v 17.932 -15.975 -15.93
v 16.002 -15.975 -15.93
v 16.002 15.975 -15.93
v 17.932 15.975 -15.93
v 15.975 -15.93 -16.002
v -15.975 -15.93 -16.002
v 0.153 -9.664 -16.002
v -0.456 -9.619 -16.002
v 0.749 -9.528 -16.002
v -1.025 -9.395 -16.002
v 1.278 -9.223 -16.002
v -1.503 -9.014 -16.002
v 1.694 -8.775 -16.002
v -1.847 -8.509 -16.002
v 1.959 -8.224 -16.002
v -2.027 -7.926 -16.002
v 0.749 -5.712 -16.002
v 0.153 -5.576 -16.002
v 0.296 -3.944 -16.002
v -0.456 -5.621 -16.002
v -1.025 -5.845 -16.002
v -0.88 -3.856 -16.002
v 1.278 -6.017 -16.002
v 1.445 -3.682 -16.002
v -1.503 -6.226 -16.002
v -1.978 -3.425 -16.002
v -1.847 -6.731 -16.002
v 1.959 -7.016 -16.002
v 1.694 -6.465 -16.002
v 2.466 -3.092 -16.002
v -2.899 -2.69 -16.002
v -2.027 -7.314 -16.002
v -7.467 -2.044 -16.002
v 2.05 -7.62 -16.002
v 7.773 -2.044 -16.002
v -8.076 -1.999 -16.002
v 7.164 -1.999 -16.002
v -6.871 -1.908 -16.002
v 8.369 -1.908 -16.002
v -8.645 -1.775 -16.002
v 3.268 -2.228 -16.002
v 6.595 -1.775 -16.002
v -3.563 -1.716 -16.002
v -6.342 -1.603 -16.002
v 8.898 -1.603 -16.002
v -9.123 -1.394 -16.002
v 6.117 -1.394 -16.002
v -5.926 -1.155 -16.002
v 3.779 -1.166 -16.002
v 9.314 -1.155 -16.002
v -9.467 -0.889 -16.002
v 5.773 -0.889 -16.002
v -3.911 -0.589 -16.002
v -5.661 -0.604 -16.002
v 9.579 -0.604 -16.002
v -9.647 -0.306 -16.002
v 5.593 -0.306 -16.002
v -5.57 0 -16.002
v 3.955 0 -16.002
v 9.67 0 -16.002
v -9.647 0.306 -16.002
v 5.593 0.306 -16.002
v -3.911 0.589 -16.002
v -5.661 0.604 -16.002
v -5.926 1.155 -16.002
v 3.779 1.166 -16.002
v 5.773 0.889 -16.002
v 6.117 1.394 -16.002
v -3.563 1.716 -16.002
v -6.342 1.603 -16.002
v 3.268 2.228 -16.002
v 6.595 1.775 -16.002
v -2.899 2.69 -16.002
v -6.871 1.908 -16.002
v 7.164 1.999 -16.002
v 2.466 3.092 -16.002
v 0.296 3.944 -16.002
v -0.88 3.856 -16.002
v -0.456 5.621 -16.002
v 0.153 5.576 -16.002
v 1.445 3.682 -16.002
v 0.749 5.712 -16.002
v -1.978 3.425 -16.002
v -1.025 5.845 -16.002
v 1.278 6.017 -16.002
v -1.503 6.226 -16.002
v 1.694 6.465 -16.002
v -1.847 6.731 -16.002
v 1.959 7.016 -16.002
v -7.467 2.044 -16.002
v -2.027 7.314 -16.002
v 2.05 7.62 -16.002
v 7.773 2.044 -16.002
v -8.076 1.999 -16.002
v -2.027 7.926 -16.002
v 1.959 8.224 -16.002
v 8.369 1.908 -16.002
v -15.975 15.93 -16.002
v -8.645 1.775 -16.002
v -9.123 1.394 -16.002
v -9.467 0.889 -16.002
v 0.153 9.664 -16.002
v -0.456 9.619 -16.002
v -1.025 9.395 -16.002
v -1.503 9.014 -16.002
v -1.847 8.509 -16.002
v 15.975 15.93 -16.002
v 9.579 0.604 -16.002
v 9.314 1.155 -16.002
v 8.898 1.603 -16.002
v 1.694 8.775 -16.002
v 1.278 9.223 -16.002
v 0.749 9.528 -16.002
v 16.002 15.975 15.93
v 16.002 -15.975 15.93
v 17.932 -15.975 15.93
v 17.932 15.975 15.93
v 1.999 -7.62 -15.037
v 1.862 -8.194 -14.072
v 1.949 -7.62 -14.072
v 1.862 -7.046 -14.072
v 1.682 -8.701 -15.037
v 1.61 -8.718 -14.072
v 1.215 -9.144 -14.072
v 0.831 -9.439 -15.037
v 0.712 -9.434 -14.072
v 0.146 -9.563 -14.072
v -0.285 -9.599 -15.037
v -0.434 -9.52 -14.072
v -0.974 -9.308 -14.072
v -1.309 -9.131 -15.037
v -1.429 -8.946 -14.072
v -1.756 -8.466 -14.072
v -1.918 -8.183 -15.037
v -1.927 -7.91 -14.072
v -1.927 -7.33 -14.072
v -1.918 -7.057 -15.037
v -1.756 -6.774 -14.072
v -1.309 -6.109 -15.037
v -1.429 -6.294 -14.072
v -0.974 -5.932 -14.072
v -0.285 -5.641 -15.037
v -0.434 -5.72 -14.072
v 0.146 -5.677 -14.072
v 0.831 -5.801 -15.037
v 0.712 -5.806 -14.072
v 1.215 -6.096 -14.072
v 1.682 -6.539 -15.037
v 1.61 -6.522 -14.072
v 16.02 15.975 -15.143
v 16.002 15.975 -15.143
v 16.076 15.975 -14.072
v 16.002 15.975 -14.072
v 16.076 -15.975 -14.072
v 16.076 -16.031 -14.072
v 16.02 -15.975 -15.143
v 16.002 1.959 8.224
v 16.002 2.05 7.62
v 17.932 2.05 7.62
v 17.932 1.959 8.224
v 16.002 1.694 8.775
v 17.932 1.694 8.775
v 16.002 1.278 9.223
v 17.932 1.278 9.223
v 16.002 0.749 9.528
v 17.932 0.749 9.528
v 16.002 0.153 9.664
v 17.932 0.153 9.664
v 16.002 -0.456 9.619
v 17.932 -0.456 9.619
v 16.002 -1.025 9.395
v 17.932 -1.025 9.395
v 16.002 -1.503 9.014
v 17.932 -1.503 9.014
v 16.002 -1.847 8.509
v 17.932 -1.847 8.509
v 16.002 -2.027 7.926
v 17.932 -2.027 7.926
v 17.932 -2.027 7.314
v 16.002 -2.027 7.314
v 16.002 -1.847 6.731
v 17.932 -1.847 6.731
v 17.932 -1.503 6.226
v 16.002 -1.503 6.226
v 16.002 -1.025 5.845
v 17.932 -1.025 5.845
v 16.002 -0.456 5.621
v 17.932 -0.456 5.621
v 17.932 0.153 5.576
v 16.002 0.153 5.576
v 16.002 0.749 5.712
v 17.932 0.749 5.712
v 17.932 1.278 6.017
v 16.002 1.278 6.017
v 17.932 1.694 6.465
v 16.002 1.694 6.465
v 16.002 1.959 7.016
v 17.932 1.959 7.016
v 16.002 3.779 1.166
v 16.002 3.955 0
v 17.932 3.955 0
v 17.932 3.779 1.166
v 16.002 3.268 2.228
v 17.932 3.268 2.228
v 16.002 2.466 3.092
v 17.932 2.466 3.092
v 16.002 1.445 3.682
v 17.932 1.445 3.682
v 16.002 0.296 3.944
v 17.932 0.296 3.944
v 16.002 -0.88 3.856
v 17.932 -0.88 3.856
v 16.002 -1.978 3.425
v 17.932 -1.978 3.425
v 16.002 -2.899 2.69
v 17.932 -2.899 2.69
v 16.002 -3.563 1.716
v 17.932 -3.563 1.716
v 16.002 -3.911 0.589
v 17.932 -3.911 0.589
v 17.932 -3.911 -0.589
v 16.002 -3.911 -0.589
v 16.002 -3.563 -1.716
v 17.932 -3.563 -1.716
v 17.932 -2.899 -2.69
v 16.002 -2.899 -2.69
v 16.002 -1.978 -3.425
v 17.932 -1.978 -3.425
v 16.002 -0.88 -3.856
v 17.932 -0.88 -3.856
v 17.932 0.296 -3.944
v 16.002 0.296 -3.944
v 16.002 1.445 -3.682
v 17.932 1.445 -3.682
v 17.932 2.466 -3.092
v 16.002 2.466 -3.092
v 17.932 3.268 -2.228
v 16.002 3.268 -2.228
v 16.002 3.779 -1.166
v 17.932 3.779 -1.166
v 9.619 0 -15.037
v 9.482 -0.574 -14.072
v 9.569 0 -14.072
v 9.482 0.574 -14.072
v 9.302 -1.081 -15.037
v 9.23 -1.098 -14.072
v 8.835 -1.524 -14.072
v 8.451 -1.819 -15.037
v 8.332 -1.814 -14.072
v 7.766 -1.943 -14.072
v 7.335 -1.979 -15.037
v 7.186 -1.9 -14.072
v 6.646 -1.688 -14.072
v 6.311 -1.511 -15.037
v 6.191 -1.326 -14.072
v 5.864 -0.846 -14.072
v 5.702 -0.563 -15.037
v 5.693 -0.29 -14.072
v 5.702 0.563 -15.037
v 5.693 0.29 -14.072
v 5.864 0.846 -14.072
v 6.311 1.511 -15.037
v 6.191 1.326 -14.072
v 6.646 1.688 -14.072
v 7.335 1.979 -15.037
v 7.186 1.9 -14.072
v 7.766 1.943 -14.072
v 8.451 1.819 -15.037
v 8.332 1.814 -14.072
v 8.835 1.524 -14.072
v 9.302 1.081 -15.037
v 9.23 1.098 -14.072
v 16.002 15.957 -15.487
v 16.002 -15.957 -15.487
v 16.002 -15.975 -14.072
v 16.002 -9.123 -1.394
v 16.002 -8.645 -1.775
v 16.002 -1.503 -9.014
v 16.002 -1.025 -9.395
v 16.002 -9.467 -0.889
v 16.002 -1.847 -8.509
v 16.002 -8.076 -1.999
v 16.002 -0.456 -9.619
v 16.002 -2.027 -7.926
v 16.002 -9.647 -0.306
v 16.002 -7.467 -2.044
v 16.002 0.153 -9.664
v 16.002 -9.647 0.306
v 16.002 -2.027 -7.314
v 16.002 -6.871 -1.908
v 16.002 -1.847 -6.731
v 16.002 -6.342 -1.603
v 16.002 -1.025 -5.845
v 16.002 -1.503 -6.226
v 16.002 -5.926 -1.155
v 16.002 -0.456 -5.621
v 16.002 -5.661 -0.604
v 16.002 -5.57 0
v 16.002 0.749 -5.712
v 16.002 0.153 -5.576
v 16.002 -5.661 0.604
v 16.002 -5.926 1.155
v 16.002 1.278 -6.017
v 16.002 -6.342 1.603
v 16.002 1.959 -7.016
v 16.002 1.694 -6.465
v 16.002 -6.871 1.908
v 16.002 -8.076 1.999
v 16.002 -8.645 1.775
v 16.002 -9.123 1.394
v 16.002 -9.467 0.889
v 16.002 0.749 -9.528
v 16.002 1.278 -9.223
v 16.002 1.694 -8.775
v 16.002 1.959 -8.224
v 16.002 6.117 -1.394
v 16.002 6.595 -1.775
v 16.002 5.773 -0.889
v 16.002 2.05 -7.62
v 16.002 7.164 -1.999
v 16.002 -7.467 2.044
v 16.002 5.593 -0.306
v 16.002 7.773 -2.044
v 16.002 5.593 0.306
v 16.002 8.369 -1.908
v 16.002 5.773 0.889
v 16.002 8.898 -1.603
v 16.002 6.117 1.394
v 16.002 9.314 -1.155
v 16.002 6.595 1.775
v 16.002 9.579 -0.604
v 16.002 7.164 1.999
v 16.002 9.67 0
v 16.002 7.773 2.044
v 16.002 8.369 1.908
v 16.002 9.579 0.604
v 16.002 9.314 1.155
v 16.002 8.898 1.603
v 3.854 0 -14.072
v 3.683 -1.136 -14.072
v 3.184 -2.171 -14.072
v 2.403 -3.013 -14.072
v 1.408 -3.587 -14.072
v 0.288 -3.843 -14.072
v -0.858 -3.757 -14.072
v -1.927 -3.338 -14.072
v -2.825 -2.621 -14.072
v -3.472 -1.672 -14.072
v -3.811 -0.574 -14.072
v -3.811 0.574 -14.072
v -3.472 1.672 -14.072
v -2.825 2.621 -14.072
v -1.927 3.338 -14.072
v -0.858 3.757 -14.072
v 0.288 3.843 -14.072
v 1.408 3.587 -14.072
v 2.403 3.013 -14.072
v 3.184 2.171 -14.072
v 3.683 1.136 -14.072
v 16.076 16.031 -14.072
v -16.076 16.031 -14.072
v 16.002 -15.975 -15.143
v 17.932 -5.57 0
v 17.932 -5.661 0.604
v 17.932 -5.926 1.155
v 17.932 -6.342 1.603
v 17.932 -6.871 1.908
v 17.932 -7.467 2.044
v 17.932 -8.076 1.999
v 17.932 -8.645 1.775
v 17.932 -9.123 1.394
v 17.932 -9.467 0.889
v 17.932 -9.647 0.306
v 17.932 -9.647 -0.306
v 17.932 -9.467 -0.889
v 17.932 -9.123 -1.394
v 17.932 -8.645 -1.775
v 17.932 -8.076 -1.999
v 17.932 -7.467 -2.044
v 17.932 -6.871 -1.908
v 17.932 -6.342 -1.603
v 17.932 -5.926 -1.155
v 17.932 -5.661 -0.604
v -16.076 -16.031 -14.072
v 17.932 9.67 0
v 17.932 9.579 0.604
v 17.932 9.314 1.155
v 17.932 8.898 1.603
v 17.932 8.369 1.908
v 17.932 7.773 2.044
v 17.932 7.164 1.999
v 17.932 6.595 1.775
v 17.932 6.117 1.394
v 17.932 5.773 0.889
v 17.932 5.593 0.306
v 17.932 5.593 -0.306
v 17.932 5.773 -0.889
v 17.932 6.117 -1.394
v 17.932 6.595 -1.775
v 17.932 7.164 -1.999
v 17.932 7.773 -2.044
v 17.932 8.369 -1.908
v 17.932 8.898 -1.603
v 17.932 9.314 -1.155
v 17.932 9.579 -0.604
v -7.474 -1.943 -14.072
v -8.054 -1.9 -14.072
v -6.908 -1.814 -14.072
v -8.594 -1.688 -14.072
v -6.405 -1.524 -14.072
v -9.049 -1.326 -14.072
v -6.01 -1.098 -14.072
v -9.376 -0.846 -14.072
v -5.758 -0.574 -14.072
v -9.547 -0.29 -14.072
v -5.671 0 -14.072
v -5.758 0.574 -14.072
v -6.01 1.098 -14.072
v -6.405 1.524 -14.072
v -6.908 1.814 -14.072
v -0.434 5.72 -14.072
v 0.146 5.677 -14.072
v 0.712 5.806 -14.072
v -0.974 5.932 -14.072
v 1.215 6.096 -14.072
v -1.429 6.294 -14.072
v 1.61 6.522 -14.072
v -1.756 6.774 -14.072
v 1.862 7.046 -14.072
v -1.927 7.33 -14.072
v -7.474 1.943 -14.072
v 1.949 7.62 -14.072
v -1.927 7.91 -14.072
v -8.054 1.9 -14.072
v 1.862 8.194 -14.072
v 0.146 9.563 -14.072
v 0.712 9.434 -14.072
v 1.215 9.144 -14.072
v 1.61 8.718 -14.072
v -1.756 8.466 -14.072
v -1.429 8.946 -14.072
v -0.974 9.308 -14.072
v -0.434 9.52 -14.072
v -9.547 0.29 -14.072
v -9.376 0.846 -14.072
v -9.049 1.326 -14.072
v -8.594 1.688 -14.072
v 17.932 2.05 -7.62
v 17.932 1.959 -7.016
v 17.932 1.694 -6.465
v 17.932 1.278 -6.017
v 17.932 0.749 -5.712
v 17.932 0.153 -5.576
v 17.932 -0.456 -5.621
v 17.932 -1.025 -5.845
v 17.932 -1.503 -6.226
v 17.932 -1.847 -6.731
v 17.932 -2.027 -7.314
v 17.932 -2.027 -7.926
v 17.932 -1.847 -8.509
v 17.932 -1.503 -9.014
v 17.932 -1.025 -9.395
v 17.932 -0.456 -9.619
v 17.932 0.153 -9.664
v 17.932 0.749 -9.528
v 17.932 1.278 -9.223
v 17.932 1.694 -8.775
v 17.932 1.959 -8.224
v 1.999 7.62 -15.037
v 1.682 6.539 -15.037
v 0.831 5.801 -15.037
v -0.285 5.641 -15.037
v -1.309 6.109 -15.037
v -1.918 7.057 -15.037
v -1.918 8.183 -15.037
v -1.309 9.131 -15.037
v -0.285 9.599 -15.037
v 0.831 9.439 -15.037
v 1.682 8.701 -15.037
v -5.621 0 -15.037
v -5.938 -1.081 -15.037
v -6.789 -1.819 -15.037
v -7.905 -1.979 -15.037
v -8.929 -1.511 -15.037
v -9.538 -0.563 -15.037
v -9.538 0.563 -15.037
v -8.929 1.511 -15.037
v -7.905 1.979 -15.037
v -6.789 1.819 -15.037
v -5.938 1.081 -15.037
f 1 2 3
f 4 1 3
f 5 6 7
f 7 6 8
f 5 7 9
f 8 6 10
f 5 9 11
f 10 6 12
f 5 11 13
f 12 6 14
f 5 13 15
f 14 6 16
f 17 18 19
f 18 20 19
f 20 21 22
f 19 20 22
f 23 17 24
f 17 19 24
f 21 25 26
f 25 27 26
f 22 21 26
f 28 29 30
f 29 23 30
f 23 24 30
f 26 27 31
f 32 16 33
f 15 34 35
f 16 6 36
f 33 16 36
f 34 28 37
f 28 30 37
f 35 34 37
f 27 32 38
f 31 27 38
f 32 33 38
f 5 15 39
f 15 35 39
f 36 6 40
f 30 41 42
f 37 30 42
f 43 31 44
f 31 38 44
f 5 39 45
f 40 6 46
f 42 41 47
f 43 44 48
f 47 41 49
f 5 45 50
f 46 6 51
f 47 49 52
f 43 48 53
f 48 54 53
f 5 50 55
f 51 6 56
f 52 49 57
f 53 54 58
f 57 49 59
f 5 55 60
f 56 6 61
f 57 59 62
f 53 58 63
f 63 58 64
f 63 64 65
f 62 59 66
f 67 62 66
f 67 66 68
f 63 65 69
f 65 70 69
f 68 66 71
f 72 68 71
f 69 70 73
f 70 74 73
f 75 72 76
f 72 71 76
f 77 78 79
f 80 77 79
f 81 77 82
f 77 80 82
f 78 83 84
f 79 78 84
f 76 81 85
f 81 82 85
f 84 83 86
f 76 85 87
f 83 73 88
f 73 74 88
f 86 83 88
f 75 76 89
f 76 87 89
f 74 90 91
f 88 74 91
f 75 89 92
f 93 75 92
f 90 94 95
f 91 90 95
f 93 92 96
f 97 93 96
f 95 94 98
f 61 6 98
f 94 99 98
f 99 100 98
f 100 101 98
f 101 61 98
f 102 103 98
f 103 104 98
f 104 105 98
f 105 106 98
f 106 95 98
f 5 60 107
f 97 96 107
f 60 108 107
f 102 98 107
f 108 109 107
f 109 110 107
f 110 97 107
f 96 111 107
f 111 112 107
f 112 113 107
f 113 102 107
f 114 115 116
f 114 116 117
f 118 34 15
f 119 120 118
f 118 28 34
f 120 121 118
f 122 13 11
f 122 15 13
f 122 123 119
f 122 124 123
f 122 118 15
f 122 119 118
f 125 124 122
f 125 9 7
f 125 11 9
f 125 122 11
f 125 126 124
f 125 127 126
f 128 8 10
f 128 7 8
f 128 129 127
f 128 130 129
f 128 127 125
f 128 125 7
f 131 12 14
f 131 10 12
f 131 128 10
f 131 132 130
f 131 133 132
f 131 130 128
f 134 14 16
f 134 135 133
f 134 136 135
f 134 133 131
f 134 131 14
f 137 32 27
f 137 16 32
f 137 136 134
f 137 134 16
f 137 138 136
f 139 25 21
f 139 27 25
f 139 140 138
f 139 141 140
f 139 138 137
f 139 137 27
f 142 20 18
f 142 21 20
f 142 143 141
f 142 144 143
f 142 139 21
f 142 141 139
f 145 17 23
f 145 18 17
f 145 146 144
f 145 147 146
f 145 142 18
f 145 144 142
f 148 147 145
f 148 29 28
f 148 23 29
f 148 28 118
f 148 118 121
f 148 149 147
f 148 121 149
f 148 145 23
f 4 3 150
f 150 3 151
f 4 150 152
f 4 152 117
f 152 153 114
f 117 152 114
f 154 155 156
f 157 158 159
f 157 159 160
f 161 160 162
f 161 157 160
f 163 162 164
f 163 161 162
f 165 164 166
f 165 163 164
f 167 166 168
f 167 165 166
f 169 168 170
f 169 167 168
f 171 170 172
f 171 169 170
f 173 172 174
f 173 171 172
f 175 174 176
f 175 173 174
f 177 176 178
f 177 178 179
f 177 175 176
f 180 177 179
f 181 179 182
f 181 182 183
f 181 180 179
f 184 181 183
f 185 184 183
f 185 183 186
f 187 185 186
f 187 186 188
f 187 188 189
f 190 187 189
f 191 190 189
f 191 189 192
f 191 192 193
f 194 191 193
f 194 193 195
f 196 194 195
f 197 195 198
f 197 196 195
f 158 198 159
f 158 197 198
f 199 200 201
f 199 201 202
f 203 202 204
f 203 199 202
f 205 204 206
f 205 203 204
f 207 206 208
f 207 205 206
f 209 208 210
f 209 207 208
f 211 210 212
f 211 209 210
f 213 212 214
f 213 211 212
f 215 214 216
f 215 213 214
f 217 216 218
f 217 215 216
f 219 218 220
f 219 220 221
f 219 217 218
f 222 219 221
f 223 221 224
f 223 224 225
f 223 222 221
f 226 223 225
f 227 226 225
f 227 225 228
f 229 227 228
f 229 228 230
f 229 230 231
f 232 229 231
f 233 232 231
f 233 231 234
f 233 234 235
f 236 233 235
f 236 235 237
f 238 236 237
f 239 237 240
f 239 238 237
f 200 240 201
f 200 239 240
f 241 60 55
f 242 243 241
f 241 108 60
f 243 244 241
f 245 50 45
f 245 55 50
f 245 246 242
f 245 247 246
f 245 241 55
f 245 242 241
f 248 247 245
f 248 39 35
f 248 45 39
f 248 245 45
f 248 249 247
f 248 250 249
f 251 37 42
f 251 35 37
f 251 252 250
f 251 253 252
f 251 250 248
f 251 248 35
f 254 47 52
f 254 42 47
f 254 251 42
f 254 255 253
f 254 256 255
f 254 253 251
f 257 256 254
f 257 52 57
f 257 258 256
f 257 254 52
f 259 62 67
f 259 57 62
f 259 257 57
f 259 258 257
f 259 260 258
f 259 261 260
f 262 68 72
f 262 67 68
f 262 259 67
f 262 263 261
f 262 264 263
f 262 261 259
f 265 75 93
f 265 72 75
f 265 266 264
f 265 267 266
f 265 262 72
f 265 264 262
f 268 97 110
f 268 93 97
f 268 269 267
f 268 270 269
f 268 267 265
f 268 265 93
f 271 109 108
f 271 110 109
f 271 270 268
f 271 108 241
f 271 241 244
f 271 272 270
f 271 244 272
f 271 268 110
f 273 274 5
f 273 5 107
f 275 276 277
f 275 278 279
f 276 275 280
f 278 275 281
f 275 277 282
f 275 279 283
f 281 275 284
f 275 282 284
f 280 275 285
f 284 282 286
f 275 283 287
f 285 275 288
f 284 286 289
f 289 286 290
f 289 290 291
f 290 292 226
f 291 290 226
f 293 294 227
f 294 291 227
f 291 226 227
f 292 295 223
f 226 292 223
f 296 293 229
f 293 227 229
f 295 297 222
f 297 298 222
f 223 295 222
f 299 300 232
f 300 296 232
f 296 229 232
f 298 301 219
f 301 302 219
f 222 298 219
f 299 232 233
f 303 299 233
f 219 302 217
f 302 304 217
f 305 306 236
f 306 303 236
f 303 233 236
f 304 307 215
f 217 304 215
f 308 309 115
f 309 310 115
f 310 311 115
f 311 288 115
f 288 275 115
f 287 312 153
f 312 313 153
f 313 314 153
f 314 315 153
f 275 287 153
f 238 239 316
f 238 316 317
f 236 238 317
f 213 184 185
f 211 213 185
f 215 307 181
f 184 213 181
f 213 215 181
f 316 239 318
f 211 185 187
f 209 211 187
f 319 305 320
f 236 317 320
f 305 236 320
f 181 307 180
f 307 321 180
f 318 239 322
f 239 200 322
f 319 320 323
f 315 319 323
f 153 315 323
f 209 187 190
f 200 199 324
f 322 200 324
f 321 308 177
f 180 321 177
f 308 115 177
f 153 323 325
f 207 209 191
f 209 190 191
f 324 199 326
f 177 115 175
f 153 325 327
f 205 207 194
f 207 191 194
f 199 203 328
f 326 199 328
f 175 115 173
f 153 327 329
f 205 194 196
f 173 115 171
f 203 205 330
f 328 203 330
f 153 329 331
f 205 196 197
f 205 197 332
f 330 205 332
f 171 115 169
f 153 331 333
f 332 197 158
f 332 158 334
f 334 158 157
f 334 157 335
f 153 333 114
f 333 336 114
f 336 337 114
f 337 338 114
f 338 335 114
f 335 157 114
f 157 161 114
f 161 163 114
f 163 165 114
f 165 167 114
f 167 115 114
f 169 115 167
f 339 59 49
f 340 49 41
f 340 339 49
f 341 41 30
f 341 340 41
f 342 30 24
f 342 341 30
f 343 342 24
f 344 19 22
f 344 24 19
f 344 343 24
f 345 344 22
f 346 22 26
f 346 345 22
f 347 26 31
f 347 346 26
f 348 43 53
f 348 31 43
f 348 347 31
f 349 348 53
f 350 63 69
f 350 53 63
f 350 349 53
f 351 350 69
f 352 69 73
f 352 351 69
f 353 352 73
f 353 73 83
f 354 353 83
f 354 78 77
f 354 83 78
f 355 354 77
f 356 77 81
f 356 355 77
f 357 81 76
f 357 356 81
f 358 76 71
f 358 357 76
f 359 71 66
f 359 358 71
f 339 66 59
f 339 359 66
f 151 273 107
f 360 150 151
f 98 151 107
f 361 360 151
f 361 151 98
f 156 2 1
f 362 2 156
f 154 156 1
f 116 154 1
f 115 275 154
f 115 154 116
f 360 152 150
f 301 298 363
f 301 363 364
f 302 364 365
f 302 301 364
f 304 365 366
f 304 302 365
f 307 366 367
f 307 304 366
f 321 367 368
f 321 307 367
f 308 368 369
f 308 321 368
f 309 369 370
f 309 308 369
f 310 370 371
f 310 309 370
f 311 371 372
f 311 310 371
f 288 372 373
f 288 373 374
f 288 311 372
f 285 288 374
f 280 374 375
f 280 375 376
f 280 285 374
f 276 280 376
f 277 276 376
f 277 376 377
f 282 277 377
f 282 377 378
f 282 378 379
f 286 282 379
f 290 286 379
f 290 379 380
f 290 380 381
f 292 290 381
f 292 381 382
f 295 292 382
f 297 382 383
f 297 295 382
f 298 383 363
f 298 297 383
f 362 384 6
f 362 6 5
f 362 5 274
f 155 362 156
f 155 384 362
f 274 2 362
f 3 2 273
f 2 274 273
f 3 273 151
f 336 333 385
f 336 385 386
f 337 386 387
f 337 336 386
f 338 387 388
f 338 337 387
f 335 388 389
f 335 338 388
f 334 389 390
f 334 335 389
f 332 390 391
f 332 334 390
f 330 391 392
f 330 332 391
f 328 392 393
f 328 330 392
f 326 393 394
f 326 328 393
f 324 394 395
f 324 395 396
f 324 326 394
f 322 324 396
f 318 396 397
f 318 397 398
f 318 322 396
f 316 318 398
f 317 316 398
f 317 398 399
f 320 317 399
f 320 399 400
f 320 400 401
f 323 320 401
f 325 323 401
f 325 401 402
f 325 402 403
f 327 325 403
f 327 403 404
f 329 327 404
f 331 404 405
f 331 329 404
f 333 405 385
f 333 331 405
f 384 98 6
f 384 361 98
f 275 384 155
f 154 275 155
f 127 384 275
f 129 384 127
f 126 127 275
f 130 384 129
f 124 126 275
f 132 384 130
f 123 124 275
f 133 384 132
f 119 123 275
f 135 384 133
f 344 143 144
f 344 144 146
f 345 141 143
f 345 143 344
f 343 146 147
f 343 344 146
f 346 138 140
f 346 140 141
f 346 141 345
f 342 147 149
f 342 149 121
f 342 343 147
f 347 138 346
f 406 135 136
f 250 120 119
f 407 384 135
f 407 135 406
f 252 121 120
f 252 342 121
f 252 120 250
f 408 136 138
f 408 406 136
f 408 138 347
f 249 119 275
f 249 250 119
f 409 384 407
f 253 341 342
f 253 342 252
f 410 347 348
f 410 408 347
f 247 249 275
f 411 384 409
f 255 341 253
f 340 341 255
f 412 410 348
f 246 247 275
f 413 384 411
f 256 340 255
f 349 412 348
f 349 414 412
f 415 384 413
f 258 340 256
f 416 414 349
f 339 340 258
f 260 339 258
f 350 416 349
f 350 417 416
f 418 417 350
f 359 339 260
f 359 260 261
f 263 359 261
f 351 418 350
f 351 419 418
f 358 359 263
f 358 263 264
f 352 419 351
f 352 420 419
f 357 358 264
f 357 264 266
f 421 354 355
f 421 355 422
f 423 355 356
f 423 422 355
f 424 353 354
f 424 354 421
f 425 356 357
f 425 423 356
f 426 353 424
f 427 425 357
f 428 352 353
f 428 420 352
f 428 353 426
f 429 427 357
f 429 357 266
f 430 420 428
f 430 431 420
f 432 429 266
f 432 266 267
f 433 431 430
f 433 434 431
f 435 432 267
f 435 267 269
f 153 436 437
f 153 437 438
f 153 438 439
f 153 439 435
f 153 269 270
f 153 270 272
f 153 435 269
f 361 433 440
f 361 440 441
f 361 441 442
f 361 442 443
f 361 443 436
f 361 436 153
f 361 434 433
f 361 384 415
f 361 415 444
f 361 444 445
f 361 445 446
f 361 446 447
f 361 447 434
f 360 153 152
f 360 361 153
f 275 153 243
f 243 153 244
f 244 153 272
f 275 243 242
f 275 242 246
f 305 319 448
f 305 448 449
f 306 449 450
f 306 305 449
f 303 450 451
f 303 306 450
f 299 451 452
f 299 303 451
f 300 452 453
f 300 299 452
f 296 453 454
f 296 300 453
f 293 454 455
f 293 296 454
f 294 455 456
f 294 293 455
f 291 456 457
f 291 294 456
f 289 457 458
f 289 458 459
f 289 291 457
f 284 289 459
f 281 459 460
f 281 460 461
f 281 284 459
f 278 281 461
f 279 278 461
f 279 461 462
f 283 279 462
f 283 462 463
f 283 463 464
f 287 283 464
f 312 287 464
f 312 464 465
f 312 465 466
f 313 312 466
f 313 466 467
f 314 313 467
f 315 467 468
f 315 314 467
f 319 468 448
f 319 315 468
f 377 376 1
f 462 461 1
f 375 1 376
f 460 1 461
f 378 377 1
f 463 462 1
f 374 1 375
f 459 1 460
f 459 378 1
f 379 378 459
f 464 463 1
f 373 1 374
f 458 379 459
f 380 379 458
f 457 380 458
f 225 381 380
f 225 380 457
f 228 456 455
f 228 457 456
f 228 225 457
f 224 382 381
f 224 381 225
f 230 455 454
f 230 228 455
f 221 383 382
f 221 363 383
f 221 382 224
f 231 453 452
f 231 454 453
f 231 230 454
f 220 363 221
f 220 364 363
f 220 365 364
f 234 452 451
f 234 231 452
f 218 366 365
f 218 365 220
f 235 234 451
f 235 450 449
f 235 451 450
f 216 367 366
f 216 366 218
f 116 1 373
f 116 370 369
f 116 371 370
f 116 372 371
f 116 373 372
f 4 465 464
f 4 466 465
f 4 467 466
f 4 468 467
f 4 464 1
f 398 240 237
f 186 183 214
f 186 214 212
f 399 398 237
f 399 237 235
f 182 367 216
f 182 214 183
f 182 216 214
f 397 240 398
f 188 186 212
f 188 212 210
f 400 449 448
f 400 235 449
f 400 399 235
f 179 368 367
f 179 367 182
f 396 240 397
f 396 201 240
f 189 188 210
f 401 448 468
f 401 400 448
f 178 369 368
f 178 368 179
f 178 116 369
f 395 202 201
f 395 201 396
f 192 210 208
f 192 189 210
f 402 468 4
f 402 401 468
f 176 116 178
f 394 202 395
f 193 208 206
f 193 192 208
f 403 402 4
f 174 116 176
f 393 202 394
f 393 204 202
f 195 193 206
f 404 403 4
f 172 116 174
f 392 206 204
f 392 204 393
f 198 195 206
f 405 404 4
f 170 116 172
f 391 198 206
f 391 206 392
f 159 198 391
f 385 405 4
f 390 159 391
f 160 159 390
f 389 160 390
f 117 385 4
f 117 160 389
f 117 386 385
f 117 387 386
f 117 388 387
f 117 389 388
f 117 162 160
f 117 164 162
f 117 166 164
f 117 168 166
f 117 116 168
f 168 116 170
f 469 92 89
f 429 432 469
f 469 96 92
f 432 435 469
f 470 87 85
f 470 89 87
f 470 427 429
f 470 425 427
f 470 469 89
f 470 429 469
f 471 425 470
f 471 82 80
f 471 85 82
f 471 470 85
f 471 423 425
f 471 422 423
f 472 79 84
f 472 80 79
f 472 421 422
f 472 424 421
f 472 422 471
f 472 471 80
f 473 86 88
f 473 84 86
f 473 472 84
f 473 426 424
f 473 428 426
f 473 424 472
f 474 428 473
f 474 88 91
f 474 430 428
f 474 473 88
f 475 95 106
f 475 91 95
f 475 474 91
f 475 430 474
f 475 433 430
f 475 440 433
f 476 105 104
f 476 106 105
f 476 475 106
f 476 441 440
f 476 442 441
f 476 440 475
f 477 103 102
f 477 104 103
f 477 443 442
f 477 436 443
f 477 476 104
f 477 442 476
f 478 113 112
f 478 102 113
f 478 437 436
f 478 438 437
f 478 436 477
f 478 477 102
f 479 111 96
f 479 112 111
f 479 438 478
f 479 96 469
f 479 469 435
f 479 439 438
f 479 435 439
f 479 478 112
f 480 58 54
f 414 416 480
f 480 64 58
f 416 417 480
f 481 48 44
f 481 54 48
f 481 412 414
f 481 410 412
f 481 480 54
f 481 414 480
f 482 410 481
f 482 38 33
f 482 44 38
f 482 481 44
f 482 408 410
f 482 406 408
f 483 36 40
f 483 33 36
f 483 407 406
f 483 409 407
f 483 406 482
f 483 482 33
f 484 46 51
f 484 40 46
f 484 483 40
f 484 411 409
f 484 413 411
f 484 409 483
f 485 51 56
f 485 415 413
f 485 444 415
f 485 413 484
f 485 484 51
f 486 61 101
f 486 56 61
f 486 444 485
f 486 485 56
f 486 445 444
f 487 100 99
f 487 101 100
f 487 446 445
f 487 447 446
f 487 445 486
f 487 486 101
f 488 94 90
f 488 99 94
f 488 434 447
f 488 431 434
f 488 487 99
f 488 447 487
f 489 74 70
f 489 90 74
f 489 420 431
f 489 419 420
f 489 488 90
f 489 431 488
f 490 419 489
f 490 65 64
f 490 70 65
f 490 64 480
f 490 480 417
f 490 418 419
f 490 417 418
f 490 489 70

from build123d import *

# Parameters (mm, degrees)
F3_W     = 31.95
F3_H     = 31.86
F3_R     = 2.05
F3_R_2   = 3.955
F4_DEPTH = 1.9304
F1_W     = 31.95
F1_H     = 31.86
F1_R     = 2.05
F1_R_2   = 3.955
F5_DEPTH = 1.9304
F5_TAPER = -3


with BuildPart() as f4:
    # F3 (on offset) → F4 (new body)
    with BuildSketch(Plane.YZ.offset(16.002)):
        Rectangle(F3_W, F3_H)
        with Locations((0, -7.62)):
            Circle(F3_R, mode=Mode.SUBTRACT)
        with Locations((-7.62, 0)):
            Circle(F3_R, mode=Mode.SUBTRACT)
        Circle(F3_R_2, mode=Mode.SUBTRACT)
        with Locations((7.62, 0)):
            Circle(F3_R, mode=Mode.SUBTRACT)
        with Locations((0, 7.62)):
            Circle(F3_R, mode=Mode.SUBTRACT)
    extrude(amount=F4_DEPTH)

    # F1 (on offset) → F5 (join)
    with BuildSketch(Plane.XY.offset(-16.002)):
        Rectangle(F1_W, F1_H)
        with Locations((0, -7.62)):
            Circle(F1_R, mode=Mode.SUBTRACT)
        with Locations((-7.62, 0)):
            Circle(F1_R, mode=Mode.SUBTRACT)
        Circle(F1_R_2, mode=Mode.SUBTRACT)
        with Locations((7.62, 0)):
            Circle(F1_R, mode=Mode.SUBTRACT)
        with Locations((0, 7.62)):
            Circle(F1_R, mode=Mode.SUBTRACT)
    extrude(amount=F5_DEPTH, taper=F5_TAPER)


solid = f4.part
